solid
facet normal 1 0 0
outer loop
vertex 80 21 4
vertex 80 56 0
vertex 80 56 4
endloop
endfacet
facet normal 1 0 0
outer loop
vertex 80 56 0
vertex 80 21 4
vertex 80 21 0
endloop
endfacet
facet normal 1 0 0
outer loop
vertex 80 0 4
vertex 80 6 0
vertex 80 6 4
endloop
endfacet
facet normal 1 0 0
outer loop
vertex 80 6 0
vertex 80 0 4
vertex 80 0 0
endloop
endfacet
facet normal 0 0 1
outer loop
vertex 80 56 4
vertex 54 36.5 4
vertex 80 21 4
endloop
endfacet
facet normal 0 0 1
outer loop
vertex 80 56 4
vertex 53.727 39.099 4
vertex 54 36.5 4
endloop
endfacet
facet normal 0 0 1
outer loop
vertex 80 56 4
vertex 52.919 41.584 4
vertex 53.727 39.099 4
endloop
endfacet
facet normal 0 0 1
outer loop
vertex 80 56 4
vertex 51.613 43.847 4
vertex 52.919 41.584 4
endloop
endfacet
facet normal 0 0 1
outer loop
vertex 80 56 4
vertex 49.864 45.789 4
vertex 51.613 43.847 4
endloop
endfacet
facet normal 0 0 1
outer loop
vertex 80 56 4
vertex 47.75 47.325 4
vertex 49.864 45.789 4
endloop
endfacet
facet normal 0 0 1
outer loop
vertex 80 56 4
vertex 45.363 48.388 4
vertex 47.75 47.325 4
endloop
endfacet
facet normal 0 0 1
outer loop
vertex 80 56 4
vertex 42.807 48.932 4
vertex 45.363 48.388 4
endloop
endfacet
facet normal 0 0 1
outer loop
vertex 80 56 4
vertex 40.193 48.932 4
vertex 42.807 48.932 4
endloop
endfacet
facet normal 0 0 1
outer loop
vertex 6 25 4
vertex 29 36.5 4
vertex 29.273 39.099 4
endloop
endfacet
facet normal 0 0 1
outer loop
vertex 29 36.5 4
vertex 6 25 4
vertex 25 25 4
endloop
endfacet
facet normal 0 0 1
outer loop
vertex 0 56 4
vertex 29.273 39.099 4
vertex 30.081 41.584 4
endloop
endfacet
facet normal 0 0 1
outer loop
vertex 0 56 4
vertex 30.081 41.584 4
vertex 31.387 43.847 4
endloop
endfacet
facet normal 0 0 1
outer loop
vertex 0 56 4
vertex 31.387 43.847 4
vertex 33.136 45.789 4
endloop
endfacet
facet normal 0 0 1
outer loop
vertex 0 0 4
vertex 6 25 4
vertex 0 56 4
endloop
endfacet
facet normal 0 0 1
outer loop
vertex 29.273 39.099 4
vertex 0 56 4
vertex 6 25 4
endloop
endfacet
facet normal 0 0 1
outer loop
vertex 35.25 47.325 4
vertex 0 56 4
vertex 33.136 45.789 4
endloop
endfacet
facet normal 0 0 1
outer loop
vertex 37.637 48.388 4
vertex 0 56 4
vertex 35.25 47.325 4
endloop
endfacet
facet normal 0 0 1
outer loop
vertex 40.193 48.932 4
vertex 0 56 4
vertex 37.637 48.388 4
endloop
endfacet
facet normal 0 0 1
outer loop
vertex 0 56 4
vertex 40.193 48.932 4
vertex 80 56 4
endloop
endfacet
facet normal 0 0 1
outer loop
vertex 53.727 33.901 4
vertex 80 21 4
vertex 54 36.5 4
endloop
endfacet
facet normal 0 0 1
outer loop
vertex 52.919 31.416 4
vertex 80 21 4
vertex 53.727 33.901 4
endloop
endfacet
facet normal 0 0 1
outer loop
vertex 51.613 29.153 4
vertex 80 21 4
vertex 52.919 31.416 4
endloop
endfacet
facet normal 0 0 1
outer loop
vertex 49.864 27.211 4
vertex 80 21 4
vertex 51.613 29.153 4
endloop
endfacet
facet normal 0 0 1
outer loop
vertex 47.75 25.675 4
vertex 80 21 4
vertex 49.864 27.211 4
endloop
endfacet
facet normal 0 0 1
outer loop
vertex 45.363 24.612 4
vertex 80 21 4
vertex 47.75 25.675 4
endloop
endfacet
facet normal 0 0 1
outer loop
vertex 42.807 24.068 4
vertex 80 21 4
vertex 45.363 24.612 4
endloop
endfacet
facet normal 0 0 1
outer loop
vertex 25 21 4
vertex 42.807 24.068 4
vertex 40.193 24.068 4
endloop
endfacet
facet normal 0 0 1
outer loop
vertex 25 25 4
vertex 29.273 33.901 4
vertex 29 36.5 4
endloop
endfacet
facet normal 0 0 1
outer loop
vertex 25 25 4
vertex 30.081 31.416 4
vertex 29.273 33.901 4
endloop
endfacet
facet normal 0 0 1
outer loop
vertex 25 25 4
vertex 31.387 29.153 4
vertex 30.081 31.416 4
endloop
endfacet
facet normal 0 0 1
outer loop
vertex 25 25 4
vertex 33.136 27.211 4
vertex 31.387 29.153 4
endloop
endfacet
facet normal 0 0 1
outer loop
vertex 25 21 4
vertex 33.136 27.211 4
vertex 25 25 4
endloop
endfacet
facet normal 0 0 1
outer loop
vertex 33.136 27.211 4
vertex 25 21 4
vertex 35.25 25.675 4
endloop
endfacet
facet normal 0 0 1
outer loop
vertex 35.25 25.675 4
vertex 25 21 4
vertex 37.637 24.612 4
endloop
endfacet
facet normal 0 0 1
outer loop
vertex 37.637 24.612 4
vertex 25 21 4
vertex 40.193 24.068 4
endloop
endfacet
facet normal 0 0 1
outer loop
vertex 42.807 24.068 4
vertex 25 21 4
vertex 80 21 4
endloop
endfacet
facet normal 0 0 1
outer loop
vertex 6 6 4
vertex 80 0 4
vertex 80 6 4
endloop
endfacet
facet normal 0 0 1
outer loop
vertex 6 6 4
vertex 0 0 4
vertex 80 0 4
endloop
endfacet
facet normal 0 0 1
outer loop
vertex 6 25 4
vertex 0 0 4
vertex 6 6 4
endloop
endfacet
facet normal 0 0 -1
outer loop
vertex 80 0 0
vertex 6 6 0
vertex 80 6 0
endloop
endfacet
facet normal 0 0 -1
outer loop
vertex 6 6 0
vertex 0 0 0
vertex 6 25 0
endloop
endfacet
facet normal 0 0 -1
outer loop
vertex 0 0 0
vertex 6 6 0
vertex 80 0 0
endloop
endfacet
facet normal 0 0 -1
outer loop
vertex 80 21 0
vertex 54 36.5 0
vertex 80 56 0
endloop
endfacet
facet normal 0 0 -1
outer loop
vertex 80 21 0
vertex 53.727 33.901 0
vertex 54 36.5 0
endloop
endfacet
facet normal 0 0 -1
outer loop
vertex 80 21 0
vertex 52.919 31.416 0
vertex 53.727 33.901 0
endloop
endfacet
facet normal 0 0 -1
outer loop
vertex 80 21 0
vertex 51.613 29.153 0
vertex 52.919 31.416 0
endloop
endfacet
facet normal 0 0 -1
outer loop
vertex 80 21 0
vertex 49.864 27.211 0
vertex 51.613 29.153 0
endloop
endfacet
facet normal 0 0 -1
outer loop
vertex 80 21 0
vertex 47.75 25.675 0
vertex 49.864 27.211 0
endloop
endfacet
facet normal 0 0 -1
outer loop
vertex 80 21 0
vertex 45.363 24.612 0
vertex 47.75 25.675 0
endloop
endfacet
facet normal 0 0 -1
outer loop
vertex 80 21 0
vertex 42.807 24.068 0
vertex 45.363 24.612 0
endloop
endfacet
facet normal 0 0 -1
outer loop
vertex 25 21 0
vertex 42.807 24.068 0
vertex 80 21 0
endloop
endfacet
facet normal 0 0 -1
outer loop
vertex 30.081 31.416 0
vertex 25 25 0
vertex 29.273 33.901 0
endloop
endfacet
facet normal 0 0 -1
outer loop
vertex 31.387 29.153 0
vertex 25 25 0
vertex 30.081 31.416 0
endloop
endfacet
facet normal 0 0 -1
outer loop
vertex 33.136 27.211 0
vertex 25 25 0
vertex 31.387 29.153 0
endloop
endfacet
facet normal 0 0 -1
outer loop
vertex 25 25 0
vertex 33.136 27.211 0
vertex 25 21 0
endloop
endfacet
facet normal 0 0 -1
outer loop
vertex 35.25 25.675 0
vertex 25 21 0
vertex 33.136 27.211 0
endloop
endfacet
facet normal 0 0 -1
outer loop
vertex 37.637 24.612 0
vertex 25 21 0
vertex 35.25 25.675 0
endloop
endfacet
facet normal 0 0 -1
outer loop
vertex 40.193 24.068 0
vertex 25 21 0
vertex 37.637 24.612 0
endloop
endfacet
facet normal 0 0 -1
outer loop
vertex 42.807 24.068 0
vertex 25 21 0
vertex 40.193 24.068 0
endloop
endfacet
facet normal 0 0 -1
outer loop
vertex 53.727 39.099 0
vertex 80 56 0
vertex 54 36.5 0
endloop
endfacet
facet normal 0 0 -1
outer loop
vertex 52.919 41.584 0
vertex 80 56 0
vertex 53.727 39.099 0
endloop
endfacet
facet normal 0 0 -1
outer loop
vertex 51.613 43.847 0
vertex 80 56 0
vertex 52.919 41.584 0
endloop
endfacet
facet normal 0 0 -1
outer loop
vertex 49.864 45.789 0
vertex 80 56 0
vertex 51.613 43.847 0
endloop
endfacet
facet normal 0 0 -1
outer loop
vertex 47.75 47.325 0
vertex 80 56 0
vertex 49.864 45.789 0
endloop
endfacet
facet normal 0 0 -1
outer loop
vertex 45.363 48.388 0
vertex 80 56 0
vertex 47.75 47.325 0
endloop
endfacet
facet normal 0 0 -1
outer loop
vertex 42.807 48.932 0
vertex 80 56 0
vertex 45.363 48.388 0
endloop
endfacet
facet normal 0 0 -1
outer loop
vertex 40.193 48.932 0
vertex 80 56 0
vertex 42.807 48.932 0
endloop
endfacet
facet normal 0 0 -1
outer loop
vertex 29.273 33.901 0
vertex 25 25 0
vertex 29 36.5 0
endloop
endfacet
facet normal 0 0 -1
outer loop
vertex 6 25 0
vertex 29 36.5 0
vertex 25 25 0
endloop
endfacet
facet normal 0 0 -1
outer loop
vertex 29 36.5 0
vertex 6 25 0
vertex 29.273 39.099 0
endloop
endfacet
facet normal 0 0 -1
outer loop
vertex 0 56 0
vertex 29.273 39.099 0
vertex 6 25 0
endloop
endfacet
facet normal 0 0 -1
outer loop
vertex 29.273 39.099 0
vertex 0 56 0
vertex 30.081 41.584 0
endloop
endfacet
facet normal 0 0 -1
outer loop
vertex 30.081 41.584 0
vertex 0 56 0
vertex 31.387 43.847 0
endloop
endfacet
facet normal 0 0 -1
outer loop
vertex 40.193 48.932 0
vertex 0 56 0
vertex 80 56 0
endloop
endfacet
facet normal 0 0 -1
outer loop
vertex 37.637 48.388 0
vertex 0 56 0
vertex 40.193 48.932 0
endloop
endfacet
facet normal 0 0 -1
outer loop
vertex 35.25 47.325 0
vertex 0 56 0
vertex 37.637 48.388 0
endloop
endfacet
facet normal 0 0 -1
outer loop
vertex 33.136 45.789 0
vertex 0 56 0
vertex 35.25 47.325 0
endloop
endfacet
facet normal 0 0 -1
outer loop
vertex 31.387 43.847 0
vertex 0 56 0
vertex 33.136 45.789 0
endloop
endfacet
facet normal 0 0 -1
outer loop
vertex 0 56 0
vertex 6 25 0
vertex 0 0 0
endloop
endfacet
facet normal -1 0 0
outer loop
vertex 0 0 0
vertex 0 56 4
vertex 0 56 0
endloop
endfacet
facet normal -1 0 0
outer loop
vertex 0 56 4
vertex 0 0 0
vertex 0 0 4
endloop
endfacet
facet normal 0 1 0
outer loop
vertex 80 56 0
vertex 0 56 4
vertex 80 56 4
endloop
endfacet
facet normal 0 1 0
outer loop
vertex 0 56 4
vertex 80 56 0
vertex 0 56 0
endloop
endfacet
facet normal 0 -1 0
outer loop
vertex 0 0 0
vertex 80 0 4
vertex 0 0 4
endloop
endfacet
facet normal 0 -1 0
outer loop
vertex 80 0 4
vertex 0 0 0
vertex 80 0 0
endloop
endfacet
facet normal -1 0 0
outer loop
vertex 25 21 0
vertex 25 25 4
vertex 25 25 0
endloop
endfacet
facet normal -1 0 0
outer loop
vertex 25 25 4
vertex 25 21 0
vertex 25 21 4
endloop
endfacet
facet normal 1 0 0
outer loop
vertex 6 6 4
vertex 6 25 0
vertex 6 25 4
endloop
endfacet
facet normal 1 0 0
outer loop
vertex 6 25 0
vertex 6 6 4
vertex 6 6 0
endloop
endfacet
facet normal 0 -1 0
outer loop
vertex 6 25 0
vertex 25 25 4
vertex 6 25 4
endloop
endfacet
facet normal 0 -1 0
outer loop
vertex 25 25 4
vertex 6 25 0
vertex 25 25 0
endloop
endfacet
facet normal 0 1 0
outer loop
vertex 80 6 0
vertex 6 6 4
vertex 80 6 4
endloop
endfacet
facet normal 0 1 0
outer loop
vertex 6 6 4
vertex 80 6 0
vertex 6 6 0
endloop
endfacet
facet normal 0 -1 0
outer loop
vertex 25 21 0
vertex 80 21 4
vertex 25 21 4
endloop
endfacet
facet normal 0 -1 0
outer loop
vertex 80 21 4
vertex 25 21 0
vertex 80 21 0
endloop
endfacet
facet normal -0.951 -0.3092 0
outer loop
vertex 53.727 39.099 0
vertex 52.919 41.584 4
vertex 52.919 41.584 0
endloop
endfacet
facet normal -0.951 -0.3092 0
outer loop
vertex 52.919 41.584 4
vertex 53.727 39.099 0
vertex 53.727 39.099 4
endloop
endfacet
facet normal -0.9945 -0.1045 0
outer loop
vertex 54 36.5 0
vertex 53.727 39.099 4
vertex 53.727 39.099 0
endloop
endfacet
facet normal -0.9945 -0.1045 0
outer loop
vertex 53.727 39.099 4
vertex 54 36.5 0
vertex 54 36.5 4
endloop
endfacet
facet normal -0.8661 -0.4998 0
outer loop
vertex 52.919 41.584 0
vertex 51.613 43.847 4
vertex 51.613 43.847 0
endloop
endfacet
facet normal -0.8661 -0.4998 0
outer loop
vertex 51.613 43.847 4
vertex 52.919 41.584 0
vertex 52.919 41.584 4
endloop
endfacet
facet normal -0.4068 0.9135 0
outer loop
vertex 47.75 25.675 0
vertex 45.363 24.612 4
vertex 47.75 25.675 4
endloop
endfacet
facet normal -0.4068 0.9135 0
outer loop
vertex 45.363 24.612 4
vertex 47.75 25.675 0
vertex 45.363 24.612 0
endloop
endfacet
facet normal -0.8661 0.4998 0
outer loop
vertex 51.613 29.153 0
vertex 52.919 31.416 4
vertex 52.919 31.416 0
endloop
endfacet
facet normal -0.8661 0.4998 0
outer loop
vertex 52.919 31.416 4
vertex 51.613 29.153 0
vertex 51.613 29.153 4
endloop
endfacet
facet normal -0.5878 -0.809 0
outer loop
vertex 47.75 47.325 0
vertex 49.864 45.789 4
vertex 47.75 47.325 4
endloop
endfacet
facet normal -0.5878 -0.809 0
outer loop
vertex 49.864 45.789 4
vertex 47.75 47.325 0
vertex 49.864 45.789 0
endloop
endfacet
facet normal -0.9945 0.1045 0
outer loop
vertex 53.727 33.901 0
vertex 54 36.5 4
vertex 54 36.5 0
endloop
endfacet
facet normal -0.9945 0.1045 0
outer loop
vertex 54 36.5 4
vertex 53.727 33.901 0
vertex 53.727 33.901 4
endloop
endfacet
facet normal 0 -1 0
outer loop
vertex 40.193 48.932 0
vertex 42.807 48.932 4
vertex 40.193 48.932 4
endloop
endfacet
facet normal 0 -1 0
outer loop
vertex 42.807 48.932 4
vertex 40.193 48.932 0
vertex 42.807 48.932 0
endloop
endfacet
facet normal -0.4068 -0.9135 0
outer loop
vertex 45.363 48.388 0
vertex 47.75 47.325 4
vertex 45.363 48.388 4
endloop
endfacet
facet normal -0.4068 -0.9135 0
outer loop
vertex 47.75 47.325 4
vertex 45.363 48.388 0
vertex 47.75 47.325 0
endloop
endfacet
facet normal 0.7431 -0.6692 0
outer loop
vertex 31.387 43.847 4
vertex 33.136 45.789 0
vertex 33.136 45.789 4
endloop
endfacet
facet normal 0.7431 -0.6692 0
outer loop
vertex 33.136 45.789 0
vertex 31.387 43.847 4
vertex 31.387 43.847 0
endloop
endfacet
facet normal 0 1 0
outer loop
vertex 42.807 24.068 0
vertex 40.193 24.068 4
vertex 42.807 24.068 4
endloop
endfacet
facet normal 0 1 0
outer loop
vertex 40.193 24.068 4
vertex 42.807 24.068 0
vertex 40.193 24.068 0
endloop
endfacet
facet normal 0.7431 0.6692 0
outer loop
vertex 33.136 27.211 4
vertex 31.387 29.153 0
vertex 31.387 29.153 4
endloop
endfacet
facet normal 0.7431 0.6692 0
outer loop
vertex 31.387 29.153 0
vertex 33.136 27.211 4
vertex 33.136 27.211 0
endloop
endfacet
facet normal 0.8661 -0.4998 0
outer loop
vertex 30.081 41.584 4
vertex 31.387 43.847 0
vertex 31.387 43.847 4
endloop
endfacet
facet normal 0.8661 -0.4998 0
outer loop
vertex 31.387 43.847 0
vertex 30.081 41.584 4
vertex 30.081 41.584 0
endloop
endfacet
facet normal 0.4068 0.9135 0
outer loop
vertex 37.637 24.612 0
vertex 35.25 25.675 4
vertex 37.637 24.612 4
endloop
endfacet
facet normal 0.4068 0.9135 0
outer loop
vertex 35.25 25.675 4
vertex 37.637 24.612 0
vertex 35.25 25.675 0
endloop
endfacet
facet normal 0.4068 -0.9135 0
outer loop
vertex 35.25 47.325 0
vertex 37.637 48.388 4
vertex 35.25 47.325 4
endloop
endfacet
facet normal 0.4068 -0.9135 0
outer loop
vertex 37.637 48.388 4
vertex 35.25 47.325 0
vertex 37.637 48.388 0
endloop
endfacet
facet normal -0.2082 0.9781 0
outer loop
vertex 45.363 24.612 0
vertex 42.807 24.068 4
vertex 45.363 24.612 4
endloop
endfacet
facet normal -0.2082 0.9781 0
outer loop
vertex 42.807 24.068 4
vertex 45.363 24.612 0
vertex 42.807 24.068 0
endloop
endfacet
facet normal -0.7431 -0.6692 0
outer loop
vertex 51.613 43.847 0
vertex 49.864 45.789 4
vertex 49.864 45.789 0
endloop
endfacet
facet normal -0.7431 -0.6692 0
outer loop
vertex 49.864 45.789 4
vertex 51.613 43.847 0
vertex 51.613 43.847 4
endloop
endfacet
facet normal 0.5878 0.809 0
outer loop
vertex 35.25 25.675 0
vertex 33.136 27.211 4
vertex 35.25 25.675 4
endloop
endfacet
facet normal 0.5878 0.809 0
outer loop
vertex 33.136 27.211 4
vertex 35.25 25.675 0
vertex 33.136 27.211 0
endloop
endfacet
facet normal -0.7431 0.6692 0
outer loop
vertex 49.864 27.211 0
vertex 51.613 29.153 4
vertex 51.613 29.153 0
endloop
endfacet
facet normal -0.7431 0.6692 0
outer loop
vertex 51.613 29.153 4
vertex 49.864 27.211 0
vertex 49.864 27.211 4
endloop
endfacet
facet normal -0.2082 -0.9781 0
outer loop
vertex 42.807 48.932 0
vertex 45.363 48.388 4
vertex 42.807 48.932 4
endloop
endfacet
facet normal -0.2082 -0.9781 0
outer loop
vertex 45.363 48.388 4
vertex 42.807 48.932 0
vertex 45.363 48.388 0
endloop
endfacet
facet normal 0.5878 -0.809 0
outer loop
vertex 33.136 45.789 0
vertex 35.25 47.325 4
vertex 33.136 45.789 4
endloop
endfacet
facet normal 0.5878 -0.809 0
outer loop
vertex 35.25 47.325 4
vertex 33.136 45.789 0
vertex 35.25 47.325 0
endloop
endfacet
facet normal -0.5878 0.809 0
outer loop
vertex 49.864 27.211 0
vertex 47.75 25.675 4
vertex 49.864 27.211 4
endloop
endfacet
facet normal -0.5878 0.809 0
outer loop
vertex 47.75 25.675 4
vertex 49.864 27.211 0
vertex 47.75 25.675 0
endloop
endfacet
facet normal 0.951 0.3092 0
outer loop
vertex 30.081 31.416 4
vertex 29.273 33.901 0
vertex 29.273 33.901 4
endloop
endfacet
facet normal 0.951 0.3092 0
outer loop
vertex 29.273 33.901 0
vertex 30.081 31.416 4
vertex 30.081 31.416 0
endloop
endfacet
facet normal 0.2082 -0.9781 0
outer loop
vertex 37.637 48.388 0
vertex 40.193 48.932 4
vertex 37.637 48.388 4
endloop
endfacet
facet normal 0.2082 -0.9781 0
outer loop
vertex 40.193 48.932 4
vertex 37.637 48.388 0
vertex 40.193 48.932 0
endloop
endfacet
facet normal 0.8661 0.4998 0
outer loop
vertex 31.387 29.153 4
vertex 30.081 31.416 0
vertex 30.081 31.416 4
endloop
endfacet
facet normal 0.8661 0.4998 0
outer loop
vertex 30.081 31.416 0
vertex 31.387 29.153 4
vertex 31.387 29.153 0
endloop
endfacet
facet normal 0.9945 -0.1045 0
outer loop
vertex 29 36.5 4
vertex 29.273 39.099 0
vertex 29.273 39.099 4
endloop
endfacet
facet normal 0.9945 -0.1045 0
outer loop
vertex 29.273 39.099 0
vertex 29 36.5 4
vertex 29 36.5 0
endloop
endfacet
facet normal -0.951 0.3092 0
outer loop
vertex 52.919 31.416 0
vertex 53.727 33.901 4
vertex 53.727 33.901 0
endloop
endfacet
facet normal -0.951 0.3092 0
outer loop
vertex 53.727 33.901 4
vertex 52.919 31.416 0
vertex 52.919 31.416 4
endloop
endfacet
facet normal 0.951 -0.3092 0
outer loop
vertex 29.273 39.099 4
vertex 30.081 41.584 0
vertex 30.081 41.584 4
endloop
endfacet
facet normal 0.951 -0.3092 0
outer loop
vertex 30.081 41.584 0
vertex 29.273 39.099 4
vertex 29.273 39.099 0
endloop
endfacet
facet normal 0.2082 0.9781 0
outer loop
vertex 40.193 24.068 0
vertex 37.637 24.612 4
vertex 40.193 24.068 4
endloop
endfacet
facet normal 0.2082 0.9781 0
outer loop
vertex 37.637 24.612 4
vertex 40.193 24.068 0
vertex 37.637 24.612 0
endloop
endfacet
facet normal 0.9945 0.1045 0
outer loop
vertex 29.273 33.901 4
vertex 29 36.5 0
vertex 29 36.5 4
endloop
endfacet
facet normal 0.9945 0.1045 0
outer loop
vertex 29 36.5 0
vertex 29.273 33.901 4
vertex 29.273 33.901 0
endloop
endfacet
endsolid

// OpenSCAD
HOLE_RADIUS = 25 / 2;
EDGE_PROFILE_THICKNESS = 18;
EDGE_INSET = 5;

LENGTH = 80;
EDGE_WIDTH = EDGE_PROFILE_THICKNESS / 3;

HEIGHT = EDGE_WIDTH + EDGE_PROFILE_THICKNESS + 2 + (HOLE_RADIUS * 2) + 5;

THICKNESS = 4;

difference() {
  union() {
      cube([LENGTH, HEIGHT, THICKNESS]);
  }
  
  translate([EDGE_WIDTH,EDGE_WIDTH,-1])
  cube([EDGE_PROFILE_THICKNESS + 1, EDGE_PROFILE_THICKNESS + 1, THICKNESS +2]);

  translate([EDGE_WIDTH,EDGE_WIDTH,-1])
  cube([LENGTH, EDGE_PROFILE_THICKNESS + 2 - EDGE_INSET, THICKNESS +2]);
  
  translate([EDGE_WIDTH + EDGE_PROFILE_THICKNESS + HOLE_RADIUS + EDGE_INSET,EDGE_WIDTH + EDGE_PROFILE_THICKNESS + HOLE_RADIUS,-1])
  cylinder(THICKNESS+2,r= HOLE_RADIUS);

}
